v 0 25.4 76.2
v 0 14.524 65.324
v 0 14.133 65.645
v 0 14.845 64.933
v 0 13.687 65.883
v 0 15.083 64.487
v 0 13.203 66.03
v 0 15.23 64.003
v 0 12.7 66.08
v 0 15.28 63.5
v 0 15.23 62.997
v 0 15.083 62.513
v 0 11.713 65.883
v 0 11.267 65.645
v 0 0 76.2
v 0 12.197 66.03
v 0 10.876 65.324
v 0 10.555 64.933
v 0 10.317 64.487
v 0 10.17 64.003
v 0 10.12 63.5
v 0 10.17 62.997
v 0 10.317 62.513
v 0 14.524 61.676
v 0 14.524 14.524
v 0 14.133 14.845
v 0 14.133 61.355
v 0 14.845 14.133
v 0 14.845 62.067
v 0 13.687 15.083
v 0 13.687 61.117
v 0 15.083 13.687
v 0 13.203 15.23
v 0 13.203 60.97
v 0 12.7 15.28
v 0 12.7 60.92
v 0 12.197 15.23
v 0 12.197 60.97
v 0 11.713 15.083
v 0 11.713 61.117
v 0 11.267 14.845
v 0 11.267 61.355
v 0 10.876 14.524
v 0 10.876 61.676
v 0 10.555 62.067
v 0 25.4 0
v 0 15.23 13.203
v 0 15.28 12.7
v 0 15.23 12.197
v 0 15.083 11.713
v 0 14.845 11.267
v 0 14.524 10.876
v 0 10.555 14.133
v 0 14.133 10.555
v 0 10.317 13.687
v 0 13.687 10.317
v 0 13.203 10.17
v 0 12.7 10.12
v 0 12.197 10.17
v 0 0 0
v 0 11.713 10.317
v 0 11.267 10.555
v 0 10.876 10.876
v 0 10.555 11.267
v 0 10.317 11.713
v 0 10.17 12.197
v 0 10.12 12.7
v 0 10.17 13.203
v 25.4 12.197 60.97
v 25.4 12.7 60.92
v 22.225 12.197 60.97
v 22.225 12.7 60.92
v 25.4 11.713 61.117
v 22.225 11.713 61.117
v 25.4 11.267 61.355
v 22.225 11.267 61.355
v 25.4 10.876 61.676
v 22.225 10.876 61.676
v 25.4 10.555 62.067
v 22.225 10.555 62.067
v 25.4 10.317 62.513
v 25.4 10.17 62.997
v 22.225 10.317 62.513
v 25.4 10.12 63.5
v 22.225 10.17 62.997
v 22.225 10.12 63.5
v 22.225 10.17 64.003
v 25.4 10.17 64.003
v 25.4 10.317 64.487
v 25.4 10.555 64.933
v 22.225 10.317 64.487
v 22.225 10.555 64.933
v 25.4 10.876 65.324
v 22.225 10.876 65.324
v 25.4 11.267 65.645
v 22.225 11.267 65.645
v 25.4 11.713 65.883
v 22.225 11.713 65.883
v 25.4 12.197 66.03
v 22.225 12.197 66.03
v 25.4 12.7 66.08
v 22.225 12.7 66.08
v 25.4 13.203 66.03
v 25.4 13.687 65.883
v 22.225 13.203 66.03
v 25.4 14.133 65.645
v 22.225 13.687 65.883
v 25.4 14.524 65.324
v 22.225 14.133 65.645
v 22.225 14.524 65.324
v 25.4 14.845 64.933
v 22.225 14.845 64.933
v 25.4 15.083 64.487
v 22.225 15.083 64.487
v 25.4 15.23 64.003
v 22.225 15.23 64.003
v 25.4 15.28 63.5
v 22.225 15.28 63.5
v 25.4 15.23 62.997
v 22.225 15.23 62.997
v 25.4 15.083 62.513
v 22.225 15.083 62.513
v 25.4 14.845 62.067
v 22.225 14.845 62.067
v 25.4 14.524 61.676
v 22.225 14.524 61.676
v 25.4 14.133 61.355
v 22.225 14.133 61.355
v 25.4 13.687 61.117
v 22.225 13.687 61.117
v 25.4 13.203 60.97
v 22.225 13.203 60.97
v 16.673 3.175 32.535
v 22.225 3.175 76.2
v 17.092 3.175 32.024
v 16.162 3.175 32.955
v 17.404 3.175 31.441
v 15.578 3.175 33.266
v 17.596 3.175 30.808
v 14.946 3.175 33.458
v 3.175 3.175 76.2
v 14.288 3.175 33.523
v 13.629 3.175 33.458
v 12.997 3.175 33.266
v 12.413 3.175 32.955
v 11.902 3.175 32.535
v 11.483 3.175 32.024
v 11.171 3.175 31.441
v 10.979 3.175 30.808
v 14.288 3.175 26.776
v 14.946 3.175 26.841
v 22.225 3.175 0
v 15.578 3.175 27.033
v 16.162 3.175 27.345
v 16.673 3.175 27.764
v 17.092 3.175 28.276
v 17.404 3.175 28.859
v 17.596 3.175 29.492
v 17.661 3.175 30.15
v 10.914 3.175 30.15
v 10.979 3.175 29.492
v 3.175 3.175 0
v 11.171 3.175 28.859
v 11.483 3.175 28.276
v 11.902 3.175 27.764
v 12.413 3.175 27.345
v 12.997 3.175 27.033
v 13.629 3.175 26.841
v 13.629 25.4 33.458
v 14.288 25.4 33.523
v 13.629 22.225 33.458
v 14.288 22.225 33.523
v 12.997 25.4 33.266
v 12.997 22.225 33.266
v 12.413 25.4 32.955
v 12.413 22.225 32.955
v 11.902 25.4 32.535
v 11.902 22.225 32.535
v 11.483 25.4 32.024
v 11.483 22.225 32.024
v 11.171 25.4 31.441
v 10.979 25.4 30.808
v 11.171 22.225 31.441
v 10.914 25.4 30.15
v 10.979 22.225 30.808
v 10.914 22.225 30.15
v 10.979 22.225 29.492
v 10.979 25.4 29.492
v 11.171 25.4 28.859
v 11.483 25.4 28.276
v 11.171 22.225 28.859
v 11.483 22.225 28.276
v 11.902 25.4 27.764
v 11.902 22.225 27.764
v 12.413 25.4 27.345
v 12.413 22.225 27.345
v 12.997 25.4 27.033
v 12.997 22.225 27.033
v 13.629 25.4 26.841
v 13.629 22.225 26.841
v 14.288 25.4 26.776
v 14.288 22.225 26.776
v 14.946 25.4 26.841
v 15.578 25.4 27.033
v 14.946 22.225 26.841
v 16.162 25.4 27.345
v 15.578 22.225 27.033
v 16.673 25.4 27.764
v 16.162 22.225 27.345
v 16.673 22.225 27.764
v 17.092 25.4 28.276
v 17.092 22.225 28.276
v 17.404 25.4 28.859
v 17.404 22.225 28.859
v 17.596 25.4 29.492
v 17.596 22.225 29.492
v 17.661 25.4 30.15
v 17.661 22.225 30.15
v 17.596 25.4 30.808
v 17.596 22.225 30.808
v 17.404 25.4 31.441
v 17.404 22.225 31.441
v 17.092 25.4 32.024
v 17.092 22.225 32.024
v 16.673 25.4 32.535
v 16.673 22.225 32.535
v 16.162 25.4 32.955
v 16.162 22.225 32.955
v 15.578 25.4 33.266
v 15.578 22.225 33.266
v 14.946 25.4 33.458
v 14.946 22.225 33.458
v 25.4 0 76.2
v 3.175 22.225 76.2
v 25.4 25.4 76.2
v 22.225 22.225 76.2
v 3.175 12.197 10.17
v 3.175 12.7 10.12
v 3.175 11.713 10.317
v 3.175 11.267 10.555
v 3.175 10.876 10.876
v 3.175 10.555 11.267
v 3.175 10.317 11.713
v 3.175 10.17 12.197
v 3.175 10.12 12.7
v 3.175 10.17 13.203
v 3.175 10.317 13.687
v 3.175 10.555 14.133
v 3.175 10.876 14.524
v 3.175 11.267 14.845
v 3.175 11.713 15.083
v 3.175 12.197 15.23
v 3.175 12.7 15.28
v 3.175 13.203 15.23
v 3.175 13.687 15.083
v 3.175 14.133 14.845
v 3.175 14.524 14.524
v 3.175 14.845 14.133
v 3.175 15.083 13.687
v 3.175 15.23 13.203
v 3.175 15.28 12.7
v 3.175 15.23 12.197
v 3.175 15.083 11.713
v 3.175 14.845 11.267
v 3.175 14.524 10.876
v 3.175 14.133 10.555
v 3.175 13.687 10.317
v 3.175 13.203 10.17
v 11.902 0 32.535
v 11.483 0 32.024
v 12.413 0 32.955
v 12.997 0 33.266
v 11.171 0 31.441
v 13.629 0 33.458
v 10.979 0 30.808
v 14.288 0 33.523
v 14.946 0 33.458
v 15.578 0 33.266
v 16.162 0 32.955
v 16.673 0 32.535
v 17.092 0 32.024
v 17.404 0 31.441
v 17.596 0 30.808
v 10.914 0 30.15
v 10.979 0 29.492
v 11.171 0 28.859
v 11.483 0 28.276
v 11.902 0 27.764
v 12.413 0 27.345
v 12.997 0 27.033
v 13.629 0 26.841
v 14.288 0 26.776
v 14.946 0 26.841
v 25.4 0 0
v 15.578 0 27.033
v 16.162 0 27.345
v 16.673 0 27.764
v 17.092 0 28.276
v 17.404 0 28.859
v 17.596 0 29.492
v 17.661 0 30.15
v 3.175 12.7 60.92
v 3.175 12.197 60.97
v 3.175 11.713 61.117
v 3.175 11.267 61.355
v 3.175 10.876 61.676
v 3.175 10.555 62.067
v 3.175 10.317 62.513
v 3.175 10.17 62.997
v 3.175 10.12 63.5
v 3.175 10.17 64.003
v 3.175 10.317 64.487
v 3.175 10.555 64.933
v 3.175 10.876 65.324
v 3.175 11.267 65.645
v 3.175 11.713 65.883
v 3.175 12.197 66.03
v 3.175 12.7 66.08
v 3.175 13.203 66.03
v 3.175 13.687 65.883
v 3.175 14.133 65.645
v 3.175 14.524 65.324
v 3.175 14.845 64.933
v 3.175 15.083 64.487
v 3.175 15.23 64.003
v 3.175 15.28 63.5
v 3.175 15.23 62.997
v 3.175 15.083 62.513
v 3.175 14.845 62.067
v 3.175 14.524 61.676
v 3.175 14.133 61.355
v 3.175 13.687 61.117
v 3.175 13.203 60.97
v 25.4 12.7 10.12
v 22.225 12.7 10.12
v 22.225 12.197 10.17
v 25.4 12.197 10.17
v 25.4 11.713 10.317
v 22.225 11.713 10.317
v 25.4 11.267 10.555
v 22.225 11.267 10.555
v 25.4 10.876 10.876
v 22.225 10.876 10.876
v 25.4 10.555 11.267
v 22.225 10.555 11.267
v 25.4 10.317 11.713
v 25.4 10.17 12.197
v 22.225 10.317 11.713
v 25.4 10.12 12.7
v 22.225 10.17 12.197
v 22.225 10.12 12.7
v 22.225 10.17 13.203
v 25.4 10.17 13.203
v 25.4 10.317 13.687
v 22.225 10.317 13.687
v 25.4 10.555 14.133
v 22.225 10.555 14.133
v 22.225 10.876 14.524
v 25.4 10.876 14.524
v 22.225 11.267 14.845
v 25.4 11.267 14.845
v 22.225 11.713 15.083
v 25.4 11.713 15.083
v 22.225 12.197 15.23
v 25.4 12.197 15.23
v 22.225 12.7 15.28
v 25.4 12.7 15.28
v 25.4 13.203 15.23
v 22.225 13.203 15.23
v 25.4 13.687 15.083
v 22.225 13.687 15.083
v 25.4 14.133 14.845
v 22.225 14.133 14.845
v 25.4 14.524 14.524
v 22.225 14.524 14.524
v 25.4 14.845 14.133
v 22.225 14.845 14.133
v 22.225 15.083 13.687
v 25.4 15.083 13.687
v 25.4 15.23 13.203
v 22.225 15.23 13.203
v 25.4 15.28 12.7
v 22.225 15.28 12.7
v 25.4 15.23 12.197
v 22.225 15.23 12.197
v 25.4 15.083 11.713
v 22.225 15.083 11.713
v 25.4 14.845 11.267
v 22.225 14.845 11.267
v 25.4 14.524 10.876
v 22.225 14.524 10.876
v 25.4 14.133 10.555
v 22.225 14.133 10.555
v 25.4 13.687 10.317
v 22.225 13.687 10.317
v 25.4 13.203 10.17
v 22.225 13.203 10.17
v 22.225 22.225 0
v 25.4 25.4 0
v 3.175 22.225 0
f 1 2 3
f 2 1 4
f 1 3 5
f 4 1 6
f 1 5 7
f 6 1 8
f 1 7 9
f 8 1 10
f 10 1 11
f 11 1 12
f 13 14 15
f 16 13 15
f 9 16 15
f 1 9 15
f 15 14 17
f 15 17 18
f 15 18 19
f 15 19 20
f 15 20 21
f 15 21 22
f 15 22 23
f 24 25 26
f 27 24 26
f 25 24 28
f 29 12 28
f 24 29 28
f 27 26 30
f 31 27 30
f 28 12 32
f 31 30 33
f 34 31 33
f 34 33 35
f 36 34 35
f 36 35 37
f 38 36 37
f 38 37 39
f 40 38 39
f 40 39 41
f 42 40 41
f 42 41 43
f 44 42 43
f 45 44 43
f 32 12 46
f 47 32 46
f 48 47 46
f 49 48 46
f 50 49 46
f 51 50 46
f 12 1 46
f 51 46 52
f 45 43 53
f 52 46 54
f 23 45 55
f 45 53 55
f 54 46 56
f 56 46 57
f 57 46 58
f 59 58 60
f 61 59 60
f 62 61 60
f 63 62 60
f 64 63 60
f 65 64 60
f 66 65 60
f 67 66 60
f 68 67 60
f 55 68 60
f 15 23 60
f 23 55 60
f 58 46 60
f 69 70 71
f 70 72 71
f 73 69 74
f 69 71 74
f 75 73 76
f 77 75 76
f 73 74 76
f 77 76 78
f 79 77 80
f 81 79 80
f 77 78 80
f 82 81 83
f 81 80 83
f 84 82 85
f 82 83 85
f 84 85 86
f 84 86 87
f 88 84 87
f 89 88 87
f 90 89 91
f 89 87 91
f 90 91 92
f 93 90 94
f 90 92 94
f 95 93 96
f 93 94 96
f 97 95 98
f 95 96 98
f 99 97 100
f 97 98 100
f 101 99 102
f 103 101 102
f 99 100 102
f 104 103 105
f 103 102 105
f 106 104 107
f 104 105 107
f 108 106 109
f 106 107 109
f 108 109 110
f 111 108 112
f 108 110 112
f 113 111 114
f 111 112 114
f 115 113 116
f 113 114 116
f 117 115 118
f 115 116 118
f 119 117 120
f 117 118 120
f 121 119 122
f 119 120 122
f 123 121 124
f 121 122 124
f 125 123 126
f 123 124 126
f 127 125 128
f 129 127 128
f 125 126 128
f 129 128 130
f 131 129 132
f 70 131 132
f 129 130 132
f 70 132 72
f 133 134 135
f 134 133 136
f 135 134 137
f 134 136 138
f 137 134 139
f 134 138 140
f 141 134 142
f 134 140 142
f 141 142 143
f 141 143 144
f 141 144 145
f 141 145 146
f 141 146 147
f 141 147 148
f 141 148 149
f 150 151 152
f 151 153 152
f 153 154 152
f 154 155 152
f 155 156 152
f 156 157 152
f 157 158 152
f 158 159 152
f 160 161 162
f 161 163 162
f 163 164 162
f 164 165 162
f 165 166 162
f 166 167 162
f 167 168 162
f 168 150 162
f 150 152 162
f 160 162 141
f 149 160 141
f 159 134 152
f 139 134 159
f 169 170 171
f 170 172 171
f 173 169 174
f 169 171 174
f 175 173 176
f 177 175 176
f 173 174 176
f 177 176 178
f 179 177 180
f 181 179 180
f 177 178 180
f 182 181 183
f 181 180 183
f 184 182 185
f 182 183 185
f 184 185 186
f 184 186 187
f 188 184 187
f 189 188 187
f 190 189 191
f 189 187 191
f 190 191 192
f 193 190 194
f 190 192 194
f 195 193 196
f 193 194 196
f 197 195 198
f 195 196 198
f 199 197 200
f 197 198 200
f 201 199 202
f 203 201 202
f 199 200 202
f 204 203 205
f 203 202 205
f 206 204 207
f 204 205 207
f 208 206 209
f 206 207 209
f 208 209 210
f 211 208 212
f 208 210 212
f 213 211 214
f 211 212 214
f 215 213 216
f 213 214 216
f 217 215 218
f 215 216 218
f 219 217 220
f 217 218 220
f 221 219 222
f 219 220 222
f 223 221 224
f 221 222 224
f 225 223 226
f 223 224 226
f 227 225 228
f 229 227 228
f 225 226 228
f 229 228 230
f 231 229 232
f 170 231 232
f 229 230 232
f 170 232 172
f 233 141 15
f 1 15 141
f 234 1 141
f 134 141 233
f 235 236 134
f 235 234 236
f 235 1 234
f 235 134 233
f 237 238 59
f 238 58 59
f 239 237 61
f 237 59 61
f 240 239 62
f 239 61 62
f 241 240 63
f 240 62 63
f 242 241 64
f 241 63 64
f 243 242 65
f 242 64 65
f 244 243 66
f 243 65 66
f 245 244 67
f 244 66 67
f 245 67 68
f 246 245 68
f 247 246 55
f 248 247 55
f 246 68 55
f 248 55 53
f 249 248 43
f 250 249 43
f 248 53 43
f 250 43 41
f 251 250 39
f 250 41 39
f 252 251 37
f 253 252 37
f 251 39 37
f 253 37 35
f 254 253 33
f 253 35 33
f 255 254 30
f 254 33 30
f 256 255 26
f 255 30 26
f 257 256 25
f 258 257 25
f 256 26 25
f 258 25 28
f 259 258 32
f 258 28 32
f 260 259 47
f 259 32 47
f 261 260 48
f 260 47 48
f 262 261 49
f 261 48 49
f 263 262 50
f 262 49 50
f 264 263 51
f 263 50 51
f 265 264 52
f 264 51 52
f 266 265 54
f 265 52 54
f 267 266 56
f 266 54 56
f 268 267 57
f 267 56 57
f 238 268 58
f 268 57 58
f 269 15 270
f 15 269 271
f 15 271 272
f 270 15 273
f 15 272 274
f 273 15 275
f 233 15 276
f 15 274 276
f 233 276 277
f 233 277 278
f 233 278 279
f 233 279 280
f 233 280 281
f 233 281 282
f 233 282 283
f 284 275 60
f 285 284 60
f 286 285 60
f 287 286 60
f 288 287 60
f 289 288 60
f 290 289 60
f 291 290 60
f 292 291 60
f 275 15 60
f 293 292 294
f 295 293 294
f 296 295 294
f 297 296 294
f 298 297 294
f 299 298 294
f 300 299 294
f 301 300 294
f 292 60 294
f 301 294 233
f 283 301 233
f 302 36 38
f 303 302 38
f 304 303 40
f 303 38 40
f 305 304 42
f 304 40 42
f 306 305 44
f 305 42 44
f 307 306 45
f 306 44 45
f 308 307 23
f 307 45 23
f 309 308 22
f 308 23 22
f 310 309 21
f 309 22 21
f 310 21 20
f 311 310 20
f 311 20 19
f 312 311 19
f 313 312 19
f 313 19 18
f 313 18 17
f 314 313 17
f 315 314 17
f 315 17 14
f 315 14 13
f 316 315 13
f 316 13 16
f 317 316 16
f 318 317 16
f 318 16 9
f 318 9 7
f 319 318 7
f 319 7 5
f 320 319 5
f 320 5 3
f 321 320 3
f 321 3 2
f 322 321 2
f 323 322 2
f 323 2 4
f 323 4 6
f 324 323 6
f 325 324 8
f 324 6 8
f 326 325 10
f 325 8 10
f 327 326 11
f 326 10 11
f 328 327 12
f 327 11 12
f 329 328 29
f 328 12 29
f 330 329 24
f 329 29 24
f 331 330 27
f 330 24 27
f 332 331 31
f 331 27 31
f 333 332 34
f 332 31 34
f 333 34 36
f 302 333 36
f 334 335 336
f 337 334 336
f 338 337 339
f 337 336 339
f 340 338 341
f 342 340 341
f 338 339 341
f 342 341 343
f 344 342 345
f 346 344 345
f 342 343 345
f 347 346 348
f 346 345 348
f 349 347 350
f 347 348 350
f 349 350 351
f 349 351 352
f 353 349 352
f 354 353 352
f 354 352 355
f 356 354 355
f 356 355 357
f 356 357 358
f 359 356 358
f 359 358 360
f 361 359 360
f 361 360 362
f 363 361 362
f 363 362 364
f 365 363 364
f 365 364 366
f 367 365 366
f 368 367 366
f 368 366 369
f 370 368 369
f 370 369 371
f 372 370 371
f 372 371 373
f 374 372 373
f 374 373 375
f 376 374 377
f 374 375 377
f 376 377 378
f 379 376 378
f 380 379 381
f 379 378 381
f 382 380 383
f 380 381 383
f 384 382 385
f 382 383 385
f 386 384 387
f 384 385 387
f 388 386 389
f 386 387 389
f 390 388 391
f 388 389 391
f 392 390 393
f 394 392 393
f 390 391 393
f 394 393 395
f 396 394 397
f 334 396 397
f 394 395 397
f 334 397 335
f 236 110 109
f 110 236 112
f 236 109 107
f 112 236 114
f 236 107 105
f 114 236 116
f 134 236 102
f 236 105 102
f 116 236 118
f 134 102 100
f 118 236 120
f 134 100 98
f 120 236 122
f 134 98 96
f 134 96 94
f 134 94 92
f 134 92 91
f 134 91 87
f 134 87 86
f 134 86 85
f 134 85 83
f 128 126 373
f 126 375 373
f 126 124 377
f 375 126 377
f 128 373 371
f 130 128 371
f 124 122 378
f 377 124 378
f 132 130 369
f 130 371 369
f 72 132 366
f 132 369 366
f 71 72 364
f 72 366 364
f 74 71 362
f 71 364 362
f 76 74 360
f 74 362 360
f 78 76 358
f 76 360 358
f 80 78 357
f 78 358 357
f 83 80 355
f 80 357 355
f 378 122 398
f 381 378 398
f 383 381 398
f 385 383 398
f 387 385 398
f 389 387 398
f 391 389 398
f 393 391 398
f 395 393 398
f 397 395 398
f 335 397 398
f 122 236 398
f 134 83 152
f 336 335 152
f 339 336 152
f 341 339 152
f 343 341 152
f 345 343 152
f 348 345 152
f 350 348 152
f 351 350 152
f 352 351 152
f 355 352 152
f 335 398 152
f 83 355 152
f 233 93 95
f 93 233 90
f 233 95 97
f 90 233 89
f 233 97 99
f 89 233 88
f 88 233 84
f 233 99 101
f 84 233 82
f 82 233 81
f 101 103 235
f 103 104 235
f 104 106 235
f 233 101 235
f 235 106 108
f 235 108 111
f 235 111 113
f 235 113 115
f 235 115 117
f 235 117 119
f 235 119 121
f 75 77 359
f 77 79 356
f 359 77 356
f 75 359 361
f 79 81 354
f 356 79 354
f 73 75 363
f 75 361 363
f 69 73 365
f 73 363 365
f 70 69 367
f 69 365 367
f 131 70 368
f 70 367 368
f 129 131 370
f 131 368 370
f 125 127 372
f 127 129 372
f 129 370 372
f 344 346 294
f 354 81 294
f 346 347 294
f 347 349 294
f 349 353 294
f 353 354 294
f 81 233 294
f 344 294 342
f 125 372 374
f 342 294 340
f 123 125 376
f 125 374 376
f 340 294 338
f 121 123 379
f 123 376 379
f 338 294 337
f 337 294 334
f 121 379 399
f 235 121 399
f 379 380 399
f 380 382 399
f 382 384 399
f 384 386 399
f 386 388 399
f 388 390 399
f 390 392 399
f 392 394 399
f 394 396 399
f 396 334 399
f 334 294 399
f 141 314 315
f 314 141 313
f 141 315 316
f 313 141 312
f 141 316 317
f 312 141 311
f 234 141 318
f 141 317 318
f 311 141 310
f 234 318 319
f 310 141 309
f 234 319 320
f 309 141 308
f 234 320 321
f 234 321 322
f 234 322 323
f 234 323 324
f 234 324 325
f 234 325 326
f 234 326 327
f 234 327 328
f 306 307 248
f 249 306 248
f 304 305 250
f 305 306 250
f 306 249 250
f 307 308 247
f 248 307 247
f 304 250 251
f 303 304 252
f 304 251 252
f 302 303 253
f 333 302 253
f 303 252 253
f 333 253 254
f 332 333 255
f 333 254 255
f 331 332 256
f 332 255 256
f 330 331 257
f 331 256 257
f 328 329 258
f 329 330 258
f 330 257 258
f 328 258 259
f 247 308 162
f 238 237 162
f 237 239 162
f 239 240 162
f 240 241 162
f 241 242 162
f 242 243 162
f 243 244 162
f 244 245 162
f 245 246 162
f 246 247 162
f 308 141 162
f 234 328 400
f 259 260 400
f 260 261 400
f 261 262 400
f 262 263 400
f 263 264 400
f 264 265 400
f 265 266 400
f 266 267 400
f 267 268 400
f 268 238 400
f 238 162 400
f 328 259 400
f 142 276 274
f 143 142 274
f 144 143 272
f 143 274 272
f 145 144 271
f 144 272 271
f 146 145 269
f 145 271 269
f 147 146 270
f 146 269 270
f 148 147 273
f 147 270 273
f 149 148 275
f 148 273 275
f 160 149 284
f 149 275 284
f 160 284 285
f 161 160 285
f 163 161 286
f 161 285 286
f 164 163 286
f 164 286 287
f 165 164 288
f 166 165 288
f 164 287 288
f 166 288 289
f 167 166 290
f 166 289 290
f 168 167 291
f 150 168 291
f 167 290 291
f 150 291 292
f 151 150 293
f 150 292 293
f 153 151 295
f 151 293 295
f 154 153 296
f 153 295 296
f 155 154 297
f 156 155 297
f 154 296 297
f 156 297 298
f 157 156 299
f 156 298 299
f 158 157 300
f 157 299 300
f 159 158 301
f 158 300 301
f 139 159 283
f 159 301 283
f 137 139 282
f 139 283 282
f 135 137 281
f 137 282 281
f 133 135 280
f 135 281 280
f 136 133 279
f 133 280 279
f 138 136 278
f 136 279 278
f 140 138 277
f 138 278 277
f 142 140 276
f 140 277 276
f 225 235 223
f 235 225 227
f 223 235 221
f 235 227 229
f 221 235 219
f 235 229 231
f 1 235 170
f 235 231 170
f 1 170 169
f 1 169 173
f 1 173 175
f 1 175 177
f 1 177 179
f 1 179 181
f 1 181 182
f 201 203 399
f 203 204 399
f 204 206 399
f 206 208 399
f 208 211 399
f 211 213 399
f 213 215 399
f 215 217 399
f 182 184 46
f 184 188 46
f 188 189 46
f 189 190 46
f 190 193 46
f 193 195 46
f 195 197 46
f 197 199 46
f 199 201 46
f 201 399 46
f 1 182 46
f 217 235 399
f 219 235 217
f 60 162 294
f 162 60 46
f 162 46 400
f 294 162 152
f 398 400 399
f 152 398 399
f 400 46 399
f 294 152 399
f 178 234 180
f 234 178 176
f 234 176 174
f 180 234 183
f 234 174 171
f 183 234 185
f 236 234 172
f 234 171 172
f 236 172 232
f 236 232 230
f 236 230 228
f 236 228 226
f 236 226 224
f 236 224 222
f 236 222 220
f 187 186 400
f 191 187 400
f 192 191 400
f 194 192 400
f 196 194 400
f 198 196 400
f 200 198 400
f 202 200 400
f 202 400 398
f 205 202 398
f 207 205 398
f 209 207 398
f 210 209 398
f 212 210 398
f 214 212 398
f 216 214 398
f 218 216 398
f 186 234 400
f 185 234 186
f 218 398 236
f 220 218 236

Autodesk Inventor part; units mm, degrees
ref_plane "YZ Plane" through (0, 0, 0) normal (1, 0, 0) x (0, 1, 0)
ref_plane "XZ Plane" through (0, 0, 0) normal (0, 1, 0) x (-1, 0, 0)
ref_plane "XY Plane" through (0, 0, 0) normal (0, 0, 1) x (1, 0, 0)
sketch "Sketch1" plane through (0, 0, 0) normal (0, 0, 1) x (1, 0, 0)
  line L0 (0, 0) -> (25.4, 0)
  line L1 (25.4, 0) -> (25.4, 25.4)
  line L2 (25.4, 25.4) -> (0, 25.4)
  line L3 (0, 25.4) -> (0, 0)
  line L4 (3.175, 22.225) -> (22.225, 22.225)
  line L5 (22.225, 22.225) -> (22.225, 3.175)
  line L6 (22.225, 3.175) -> (3.175, 3.175)
  line L7 (3.175, 3.175) -> (3.175, 22.225)
  dimension "d0" = 25.4
  dimension "d1" = 25.4
  dimension "d2" = 3.175
extrude "Extrusion1" add sketch "Sketch1" along normal blind 76.2
sketch "Sketch2" plane through (25.4, 0, 0) normal (1, 0, 0) x (0, 0, -1)
  line L0 (0, 0) -> (0, 25.4) projected
  line L1 (-76.2, 0) -> (-76.2, 25.4) projected
  line L2 (0, 25.4) -> (-76.2, 25.4) projected
  point P0 (-63.5, 12.7)
  point P1 (-12.7, 12.7)
  dimension "d5" = 12.7
  dimension "d6" = 12.7
  dimension "d7" = 12.7
  dimension "d8" = 12.7
hole "Hole1" at (25.4, 12.7, 63.5) at (25.4, 12.7, 12.7) direction (-1, 0, 0) diameter 5.1594 end through all
sketch "Sketch3" plane through (0, 25.4, 0) normal (0, 1, 0) x (1, 0, 0)
  line L0 (25.4, -76.2) -> (0, -76.2) projected
  line L1 (25.4, 0) -> (25.4, -76.2) projected
  point P0 (0, 0)
  point P1 (14.2875, -30.1498)
  dimension "d16" = 46.0502
  dimension "d17" = 11.1125
hole "Hole2" at (14.2875, 25.4, 30.1498) direction (0, -1, 0) diameter 6.7469 end through all
properties part number "1512898-16-A-0901"
